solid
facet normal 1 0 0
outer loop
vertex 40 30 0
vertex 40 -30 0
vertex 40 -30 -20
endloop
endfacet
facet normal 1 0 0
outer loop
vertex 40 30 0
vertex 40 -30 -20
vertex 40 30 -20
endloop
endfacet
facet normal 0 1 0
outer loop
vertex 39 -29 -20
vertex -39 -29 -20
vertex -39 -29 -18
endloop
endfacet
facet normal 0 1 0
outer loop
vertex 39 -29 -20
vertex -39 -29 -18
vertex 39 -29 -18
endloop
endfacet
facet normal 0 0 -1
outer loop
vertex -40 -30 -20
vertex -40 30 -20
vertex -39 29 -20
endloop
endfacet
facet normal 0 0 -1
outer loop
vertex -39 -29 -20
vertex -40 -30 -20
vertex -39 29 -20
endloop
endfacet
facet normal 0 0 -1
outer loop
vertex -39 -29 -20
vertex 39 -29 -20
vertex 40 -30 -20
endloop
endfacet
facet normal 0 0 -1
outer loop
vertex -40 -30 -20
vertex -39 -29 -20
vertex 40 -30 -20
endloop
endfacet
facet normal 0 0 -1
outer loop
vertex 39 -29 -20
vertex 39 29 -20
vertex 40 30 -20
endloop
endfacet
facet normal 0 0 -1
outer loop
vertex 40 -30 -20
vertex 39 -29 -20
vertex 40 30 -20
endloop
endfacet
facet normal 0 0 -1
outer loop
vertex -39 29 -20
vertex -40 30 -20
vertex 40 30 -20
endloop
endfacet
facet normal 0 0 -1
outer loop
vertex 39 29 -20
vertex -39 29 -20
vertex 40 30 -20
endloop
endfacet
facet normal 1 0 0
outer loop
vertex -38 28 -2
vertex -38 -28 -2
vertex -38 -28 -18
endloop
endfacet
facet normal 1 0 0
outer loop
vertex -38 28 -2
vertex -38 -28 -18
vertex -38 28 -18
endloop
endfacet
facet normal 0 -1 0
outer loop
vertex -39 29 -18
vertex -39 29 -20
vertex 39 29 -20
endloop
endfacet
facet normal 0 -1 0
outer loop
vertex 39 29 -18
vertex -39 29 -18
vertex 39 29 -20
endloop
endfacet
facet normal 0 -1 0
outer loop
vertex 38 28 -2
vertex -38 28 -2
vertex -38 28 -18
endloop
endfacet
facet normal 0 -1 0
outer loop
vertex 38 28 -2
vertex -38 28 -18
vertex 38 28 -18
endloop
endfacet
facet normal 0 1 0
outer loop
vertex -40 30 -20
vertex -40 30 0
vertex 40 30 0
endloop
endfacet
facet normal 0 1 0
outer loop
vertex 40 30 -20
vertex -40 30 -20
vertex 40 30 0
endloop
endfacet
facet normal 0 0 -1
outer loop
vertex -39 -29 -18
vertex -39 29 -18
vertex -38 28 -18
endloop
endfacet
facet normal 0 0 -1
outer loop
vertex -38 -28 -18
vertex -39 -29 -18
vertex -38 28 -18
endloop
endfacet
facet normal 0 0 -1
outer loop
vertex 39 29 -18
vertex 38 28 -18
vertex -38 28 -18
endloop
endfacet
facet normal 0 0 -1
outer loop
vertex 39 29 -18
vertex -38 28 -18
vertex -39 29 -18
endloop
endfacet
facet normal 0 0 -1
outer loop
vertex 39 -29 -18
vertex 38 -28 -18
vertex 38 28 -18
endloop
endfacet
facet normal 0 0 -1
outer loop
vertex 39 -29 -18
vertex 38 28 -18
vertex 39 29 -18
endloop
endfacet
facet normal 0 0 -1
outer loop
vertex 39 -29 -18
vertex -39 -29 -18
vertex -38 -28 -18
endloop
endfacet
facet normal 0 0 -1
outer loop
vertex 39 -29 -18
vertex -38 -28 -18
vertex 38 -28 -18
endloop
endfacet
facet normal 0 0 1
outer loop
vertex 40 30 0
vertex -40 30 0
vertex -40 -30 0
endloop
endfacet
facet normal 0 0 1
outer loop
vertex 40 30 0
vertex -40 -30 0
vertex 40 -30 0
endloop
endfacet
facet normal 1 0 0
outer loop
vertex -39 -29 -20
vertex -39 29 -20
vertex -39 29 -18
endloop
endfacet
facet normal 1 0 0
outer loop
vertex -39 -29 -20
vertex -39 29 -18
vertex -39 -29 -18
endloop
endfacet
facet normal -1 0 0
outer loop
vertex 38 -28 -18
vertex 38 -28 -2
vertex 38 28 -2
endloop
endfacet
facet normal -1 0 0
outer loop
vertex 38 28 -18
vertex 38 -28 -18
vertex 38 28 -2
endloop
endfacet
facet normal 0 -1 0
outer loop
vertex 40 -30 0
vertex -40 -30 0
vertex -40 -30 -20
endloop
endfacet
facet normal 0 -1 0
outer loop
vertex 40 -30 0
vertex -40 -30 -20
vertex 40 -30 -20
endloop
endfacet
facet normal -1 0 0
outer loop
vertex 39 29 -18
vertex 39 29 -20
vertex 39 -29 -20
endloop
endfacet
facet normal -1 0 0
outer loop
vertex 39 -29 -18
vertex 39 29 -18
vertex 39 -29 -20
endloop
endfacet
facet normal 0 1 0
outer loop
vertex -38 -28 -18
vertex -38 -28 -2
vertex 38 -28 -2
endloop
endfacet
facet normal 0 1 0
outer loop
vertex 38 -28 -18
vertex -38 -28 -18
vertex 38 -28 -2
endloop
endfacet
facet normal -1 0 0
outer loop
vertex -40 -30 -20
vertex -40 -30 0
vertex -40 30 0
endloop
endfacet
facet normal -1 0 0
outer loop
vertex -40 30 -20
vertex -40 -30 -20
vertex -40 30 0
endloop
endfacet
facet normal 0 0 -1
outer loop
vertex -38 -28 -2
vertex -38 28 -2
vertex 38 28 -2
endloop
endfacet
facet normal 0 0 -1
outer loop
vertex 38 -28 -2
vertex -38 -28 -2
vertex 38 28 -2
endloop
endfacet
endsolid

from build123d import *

# Parameters (mm, degrees)
F0_W     = 80
F0_H     = 60
F1_DEPTH = 20
F2_T     = -2
F3_W     = 77.999998
F3_H     = 57.999998
F4_DEPTH = 2


with BuildPart() as f1:
    # F0 (on Top) → F1 (new body)
    with BuildSketch(Plane.XY):
        Rectangle(F0_W, F0_H)
    extrude(amount=-F1_DEPTH)

    # F2
    f2_openings = [f1.faces().sort_by_distance(p)[0] for p in [
        (0, 0, -20),
    ]]
    offset(amount=F2_T, openings=f2_openings)

    # F3 (on face) → F4 (cut)
    with BuildSketch(Plane(origin=(0, 0, -20), x_dir=(1, 0, 0), z_dir=(0, 0, -1))):
        Rectangle(F3_W, F3_H)
    extrude(amount=-F4_DEPTH, mode=Mode.SUBTRACT)


solid = f1.part
